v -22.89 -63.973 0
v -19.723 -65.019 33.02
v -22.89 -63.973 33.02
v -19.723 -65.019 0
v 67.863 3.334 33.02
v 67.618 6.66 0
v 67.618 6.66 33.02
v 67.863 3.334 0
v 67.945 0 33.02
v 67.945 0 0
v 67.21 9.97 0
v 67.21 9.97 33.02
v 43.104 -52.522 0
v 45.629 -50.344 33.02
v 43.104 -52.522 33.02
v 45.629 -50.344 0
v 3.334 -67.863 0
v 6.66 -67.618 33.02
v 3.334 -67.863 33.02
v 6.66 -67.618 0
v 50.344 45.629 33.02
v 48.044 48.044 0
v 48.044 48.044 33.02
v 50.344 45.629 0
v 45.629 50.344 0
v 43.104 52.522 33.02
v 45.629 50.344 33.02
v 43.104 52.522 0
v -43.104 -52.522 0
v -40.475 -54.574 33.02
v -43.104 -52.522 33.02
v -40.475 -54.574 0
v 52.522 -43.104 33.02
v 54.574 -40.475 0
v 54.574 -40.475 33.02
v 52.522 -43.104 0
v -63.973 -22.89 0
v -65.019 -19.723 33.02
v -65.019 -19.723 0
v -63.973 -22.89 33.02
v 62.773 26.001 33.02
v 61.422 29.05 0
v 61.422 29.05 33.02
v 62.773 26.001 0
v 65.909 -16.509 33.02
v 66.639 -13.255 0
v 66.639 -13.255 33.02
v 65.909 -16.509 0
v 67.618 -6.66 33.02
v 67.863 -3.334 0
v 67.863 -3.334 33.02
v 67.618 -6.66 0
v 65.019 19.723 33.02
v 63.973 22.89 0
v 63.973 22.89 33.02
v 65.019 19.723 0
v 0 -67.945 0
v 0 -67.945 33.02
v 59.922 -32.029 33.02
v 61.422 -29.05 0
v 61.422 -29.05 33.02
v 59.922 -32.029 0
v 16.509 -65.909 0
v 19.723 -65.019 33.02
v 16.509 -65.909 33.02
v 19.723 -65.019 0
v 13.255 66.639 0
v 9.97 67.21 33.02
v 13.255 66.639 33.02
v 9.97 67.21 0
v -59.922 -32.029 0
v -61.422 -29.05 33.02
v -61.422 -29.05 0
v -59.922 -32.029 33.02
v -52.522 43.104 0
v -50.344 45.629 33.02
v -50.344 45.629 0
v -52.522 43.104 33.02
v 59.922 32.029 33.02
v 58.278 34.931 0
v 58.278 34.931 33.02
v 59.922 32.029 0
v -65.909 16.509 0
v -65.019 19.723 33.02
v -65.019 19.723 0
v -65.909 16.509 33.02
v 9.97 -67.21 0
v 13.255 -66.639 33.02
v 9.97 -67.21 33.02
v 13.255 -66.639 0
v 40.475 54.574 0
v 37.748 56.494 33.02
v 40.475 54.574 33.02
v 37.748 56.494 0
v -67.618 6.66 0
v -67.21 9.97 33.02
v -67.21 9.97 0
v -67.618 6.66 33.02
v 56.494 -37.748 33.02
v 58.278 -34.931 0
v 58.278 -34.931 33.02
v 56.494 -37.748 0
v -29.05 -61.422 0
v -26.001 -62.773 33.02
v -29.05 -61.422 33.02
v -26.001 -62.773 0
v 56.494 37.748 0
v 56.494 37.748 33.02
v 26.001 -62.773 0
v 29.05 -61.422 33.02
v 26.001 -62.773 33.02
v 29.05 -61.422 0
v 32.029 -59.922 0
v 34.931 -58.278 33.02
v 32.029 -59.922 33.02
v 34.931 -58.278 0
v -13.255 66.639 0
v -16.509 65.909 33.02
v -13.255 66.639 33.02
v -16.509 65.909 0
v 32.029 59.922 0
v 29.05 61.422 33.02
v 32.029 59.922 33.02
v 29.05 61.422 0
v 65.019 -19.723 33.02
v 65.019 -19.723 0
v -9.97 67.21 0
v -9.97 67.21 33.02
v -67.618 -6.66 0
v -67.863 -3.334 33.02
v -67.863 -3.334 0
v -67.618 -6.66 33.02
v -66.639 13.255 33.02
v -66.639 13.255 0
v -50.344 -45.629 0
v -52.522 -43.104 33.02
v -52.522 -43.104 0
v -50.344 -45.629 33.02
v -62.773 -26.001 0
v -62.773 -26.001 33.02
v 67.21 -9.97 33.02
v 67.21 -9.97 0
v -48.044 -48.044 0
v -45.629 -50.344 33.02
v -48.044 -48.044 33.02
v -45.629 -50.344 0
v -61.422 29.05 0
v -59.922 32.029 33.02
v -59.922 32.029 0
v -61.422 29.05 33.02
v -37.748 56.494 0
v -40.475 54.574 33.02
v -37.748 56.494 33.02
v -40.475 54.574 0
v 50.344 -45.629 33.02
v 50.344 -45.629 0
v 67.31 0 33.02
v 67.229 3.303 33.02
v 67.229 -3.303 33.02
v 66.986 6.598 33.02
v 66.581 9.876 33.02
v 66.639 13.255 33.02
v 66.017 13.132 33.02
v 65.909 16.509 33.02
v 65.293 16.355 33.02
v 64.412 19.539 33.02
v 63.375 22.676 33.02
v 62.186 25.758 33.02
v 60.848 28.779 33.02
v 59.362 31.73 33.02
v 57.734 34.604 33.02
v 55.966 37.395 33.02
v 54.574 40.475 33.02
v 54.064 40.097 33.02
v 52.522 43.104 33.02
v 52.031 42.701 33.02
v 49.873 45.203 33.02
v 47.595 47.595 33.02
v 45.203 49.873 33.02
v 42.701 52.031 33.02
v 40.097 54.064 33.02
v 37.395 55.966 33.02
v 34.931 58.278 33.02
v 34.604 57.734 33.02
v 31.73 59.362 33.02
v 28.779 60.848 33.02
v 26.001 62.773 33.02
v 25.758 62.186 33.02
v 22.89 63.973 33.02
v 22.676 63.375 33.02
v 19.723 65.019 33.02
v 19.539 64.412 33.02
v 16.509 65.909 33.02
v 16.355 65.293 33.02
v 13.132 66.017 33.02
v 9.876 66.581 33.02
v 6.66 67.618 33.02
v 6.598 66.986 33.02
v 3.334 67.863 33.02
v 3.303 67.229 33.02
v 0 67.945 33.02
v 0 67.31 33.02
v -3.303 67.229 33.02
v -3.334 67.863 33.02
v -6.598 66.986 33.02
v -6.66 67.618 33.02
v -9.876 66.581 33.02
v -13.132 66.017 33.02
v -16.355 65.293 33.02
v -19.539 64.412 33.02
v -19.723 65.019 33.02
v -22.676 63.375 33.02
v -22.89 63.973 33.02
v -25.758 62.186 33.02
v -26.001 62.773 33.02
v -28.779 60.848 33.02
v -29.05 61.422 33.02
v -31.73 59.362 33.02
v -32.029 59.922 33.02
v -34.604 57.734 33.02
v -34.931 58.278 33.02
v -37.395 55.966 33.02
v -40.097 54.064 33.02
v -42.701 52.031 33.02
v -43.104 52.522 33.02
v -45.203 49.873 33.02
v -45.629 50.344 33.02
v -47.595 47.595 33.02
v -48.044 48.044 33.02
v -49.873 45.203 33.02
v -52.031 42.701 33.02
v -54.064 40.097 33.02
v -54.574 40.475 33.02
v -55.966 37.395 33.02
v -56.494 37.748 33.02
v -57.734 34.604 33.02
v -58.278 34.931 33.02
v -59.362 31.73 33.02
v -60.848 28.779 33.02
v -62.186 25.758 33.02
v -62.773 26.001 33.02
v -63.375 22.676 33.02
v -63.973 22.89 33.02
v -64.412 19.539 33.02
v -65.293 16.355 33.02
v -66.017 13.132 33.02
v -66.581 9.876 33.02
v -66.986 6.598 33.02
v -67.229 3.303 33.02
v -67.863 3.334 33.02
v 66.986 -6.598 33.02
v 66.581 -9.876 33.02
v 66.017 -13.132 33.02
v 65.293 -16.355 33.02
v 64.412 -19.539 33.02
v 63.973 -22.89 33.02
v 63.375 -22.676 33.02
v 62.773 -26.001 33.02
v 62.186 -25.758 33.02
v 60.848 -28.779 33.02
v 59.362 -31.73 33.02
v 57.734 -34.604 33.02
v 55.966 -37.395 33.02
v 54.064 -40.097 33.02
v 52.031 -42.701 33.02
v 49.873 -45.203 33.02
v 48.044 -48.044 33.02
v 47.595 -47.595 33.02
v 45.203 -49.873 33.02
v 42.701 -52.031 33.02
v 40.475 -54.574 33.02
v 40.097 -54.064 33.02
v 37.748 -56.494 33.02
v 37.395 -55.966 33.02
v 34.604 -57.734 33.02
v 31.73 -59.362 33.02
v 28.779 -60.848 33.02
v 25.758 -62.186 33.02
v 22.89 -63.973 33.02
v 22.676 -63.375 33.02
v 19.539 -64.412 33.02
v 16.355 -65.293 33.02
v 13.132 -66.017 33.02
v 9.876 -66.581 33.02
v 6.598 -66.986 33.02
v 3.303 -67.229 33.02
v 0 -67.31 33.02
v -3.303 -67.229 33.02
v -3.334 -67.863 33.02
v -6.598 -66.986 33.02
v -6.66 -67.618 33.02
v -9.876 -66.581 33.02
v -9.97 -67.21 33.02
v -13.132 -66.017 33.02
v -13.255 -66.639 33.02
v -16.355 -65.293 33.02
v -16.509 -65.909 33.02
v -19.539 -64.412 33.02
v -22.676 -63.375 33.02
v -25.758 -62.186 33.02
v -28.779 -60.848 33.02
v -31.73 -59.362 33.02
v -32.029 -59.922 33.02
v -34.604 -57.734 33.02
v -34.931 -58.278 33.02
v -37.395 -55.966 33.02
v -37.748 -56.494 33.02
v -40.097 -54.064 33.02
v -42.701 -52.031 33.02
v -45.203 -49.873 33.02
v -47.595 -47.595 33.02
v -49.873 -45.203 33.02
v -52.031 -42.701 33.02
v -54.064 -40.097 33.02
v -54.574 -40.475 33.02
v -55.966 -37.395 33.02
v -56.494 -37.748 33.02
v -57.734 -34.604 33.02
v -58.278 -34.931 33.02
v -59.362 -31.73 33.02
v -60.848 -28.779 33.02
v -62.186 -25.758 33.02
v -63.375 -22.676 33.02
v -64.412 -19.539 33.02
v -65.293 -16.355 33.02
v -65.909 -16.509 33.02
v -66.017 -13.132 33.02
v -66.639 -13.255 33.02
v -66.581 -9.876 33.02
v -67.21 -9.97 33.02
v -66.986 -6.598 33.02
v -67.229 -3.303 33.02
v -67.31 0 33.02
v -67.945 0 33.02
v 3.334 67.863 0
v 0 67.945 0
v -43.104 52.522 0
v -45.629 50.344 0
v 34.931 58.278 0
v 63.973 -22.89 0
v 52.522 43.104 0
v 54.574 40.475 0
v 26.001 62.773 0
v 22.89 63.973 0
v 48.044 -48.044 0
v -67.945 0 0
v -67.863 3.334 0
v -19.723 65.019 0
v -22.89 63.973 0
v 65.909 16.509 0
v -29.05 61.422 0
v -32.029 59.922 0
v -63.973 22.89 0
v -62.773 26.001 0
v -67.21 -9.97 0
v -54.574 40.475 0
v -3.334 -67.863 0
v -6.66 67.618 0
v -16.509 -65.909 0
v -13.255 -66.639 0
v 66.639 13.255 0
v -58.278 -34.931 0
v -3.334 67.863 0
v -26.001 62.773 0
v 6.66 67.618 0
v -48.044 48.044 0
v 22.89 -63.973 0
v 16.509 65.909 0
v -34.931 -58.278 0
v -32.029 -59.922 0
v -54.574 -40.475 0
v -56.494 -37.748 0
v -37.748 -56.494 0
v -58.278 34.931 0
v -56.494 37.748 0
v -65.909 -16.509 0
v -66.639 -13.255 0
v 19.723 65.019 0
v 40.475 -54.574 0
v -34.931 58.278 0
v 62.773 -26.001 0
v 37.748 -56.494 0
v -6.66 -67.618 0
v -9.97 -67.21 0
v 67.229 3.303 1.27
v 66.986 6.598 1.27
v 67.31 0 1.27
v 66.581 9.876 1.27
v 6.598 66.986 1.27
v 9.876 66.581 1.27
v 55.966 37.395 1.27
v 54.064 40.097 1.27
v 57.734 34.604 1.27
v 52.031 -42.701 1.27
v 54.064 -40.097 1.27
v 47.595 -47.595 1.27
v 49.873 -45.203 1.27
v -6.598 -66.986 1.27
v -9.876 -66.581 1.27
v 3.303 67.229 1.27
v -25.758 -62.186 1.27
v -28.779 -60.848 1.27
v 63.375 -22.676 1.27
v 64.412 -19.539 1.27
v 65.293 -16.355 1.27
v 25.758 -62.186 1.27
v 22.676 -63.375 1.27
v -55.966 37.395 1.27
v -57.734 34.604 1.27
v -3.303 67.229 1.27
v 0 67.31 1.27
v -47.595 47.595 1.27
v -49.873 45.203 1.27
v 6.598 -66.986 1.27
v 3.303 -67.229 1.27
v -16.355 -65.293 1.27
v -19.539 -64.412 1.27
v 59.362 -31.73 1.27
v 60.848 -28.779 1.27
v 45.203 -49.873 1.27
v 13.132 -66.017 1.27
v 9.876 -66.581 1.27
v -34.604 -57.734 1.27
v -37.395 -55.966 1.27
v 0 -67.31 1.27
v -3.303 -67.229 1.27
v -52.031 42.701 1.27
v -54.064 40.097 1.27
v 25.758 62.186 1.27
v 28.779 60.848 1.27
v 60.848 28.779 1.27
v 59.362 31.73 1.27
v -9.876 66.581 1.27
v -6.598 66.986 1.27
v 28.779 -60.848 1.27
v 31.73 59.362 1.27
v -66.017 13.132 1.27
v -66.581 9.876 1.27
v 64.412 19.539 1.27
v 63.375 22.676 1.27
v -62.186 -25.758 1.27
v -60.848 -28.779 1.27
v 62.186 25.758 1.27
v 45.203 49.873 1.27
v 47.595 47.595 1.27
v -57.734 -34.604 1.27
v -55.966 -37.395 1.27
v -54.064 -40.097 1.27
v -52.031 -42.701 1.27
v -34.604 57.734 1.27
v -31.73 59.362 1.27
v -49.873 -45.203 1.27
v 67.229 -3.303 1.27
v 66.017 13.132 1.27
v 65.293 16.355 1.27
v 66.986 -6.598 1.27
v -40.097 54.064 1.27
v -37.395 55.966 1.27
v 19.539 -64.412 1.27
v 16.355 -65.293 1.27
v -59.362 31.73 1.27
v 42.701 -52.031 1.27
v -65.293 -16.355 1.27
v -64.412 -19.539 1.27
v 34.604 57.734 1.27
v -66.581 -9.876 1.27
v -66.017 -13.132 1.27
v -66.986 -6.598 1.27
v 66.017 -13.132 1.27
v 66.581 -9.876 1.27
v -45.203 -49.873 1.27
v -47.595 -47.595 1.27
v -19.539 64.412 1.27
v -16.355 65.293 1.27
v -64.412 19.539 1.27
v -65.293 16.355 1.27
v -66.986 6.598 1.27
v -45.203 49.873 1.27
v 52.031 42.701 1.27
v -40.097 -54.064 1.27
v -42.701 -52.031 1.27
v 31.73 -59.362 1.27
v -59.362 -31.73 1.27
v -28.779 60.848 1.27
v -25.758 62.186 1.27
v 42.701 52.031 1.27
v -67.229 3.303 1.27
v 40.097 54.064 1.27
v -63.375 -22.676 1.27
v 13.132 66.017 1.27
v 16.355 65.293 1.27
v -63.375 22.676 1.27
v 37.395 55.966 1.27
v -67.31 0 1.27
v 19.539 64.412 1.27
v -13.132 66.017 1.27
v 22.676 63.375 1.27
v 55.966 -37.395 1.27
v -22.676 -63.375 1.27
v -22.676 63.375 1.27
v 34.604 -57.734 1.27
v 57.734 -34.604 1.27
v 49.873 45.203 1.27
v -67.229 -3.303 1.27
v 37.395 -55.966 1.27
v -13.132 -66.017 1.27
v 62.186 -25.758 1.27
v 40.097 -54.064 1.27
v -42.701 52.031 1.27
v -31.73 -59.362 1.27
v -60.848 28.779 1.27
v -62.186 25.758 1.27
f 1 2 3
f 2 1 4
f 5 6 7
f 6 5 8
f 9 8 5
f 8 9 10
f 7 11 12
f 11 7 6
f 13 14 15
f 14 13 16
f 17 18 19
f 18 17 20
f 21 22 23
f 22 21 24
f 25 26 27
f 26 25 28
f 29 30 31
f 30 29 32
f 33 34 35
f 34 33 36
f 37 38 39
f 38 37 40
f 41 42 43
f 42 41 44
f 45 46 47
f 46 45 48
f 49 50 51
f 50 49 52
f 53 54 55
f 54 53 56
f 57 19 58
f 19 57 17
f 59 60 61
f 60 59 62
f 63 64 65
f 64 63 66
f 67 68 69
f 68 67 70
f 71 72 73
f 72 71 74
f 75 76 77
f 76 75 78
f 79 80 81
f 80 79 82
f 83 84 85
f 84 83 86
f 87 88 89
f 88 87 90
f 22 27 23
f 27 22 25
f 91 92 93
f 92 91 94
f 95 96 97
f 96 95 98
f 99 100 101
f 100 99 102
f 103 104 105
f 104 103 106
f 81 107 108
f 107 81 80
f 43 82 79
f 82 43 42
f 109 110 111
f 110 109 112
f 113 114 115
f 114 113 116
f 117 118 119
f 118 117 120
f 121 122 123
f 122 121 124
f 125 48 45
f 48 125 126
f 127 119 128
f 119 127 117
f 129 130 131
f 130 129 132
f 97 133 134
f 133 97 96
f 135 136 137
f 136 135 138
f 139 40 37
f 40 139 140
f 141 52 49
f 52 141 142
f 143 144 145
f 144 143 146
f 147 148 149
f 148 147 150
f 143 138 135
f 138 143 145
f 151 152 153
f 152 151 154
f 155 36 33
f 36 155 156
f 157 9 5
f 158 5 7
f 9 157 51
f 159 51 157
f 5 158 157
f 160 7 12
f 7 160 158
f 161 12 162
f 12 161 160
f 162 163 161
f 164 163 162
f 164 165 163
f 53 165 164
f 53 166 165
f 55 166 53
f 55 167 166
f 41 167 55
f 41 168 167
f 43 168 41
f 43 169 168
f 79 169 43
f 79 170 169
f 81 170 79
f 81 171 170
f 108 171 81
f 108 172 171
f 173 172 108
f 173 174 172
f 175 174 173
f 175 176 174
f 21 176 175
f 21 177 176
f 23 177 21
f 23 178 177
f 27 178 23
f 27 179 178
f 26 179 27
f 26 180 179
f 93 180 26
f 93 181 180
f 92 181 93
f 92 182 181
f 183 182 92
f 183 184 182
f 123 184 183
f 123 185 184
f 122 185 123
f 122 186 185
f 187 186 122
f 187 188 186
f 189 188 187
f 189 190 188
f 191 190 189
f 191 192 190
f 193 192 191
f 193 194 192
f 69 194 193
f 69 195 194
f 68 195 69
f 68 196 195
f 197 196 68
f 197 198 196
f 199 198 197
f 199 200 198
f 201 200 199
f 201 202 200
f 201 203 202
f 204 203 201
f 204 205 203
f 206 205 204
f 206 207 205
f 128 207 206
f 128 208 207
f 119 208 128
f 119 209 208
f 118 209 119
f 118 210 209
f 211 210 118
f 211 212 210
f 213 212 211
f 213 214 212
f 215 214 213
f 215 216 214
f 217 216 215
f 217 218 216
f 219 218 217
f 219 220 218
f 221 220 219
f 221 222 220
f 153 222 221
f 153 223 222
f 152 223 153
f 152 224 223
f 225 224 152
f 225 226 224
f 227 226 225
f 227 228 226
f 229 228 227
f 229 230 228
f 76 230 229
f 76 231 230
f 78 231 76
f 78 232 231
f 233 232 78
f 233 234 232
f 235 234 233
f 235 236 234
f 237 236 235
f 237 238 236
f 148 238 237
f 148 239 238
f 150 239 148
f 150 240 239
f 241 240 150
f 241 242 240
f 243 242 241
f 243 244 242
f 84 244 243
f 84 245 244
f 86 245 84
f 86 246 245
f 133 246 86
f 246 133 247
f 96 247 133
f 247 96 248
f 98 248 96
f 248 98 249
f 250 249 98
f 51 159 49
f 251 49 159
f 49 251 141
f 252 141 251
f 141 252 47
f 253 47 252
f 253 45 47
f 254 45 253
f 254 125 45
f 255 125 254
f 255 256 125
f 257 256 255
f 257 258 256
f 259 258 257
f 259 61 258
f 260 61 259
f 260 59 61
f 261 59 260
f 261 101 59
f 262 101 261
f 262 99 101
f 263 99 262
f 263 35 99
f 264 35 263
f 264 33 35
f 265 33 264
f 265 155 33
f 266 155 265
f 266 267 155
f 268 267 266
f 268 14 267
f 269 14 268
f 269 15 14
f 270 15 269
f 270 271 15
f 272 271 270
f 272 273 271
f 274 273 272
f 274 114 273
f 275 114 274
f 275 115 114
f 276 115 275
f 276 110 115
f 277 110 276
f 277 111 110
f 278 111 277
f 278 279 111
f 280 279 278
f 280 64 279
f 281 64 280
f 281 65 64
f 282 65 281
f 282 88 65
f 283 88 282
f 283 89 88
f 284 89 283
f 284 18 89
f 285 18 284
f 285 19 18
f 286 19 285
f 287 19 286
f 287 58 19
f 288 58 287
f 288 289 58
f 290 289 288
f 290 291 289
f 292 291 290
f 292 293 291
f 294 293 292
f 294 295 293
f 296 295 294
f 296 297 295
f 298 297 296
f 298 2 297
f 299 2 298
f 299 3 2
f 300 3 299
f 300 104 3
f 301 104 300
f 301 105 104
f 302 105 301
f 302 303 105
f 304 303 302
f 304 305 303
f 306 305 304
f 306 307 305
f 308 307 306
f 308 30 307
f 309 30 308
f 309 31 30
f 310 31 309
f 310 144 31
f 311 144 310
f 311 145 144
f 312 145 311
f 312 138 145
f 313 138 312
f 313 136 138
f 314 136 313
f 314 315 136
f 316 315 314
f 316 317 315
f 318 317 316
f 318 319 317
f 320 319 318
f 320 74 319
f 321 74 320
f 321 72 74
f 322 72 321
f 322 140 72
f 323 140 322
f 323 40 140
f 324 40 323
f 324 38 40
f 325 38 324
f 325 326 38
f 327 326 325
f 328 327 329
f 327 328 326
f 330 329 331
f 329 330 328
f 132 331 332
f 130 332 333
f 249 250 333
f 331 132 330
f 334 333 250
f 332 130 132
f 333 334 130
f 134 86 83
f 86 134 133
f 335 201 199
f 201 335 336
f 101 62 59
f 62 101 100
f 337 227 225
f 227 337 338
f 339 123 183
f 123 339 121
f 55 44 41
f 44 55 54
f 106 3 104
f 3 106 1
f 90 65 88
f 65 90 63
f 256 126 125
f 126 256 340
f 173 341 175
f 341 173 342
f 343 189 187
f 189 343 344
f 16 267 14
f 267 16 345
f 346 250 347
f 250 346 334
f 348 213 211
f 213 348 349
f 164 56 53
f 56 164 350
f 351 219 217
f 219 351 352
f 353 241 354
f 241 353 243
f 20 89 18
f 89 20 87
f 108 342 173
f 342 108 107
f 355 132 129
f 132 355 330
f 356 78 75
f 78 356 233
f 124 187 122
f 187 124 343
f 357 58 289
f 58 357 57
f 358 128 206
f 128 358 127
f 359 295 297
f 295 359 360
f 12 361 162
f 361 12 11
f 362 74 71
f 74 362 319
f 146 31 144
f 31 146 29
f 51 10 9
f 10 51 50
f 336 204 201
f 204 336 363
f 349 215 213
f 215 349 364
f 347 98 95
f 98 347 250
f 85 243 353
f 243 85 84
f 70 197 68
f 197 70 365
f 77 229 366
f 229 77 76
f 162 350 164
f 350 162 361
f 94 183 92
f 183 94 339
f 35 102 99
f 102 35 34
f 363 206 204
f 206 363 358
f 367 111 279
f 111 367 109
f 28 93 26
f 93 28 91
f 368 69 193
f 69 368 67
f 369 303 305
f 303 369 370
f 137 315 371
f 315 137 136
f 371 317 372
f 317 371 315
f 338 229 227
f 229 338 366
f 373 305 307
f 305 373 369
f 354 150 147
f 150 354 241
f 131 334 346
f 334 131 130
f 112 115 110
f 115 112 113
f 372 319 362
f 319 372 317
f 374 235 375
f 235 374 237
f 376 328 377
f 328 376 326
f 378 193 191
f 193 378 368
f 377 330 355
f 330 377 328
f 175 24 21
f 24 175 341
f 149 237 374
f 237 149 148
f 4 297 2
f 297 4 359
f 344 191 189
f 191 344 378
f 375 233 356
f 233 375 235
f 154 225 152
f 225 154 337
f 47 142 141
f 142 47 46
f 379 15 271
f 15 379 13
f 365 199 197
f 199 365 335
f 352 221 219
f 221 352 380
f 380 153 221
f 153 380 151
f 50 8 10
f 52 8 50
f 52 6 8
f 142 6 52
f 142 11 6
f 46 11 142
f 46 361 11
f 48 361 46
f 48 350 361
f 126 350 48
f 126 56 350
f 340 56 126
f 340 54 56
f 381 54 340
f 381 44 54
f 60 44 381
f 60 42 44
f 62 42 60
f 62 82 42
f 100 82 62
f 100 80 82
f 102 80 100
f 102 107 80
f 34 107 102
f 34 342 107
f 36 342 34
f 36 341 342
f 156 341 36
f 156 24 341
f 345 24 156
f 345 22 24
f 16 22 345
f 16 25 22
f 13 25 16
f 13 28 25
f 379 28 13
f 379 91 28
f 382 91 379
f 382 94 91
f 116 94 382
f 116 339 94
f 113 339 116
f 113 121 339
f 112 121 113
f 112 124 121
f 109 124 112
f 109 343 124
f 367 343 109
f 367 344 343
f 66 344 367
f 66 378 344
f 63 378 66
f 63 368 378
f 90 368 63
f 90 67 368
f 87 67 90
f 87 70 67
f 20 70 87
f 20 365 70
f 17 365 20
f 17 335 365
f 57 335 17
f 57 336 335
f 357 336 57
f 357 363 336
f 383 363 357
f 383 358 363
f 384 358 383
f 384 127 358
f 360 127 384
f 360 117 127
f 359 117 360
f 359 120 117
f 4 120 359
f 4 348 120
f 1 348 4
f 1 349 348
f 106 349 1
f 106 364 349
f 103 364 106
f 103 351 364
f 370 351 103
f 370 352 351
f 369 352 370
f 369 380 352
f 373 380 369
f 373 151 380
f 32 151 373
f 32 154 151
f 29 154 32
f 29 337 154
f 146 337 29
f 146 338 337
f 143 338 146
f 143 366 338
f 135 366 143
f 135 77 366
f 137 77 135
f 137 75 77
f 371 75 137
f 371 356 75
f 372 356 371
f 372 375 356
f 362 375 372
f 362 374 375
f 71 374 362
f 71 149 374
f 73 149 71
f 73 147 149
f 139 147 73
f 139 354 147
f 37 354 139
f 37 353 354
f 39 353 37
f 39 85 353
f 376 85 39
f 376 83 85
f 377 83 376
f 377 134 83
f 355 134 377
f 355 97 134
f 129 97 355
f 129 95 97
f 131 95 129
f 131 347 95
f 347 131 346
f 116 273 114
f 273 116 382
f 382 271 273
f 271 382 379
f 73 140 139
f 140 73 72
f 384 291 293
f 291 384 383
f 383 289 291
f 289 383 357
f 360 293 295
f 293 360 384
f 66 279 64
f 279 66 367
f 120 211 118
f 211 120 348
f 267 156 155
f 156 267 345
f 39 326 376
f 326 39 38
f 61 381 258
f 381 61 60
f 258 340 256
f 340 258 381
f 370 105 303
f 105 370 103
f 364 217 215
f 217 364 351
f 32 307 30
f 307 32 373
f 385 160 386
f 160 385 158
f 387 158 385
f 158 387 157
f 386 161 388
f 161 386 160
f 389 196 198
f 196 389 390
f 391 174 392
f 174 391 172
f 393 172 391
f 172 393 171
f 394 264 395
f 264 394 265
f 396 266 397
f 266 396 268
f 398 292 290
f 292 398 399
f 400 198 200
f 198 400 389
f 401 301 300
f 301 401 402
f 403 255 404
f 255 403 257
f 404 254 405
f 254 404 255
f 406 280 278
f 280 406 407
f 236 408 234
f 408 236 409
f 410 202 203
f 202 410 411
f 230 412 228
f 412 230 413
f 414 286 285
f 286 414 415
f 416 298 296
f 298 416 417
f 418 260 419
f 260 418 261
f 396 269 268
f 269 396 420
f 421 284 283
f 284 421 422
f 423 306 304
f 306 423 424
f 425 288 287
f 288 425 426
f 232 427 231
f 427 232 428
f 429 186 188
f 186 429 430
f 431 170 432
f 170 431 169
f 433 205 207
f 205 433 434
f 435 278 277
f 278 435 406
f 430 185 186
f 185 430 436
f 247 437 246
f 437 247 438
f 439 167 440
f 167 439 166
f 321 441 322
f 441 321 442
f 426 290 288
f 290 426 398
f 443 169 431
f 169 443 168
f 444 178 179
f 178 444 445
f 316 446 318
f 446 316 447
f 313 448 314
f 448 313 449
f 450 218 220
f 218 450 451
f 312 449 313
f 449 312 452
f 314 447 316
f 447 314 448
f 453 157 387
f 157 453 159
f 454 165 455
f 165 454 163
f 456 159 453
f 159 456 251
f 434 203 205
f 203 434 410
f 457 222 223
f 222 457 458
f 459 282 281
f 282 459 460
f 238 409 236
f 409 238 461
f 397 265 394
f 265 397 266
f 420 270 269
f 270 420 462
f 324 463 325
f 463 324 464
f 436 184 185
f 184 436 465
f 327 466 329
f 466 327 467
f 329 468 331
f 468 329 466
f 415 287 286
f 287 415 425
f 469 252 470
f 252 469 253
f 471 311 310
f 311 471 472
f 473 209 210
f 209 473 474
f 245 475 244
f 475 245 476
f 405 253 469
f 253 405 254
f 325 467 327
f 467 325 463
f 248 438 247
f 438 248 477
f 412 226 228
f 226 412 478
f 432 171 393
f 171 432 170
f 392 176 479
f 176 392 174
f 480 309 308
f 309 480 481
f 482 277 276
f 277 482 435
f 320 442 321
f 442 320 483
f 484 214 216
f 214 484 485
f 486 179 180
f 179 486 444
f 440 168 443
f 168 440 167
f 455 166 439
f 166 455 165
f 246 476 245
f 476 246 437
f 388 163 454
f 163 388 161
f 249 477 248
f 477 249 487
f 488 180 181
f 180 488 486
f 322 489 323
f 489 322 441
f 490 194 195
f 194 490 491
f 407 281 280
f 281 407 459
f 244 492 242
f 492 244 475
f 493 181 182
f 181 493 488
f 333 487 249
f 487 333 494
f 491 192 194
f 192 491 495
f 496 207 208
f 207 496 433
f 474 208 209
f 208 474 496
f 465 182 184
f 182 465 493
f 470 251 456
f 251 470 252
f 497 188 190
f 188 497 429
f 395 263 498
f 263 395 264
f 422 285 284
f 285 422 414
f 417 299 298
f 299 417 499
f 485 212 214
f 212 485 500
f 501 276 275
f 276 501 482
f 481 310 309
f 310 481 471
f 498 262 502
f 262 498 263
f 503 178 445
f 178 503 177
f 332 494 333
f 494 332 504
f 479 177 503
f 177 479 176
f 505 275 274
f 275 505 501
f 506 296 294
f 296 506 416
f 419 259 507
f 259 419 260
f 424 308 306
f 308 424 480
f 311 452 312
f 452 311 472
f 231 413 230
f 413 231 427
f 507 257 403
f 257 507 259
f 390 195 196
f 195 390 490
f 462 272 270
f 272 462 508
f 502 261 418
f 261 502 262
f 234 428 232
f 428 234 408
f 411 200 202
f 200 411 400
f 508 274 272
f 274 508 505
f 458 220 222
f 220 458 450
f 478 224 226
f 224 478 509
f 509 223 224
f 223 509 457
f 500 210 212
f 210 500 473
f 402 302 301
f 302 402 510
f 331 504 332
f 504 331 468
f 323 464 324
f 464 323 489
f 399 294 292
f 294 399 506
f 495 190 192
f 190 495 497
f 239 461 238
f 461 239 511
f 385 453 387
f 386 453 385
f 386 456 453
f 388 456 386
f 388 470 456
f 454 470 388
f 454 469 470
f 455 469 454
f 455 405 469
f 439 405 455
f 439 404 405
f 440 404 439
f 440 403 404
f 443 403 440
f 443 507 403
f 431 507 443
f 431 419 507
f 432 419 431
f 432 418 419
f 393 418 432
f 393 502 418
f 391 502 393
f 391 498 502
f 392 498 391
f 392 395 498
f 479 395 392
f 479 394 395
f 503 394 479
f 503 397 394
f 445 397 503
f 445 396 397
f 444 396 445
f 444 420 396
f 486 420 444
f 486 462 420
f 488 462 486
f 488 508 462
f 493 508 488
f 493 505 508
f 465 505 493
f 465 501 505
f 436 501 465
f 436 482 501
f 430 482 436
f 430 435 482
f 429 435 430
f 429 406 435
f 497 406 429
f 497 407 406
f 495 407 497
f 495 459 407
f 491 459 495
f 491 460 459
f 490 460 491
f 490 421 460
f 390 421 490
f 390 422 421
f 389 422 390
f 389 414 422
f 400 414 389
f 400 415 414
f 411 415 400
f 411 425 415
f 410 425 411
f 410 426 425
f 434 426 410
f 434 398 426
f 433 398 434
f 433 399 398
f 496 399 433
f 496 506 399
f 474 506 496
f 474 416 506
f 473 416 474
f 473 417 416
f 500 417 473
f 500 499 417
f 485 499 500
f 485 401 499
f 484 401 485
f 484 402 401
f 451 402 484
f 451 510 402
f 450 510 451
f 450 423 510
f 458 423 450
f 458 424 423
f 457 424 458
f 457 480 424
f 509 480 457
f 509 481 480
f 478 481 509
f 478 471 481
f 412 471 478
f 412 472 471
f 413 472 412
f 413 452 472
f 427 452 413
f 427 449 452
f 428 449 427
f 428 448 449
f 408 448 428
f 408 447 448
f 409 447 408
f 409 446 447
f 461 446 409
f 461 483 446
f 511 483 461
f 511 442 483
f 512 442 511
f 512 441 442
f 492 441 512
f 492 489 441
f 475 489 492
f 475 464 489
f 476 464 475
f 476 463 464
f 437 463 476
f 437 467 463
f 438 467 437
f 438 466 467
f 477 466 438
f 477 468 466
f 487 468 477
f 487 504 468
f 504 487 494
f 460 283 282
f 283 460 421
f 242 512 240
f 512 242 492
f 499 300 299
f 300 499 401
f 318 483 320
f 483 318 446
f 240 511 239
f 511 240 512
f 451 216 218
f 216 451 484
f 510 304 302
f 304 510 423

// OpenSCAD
inchesToMM = 25.4;

capInner= 5.3 * inchesToMM;
capLength = 1.3 * inchesToMM;
thickness = .05 * inchesToMM;
capOuter = capInner+thickness;


module capO ()
{
    cylinder (h = capLength, d = capOuter, $fn = 128);
}
module capI ()
{
    cylinder (h = capLength, d = capInner, $fn = 128);
}




module thing ()
{
    difference()
    {
        capO();
        translate([0,0,thickness])
        capI();
    }
}
thing();
